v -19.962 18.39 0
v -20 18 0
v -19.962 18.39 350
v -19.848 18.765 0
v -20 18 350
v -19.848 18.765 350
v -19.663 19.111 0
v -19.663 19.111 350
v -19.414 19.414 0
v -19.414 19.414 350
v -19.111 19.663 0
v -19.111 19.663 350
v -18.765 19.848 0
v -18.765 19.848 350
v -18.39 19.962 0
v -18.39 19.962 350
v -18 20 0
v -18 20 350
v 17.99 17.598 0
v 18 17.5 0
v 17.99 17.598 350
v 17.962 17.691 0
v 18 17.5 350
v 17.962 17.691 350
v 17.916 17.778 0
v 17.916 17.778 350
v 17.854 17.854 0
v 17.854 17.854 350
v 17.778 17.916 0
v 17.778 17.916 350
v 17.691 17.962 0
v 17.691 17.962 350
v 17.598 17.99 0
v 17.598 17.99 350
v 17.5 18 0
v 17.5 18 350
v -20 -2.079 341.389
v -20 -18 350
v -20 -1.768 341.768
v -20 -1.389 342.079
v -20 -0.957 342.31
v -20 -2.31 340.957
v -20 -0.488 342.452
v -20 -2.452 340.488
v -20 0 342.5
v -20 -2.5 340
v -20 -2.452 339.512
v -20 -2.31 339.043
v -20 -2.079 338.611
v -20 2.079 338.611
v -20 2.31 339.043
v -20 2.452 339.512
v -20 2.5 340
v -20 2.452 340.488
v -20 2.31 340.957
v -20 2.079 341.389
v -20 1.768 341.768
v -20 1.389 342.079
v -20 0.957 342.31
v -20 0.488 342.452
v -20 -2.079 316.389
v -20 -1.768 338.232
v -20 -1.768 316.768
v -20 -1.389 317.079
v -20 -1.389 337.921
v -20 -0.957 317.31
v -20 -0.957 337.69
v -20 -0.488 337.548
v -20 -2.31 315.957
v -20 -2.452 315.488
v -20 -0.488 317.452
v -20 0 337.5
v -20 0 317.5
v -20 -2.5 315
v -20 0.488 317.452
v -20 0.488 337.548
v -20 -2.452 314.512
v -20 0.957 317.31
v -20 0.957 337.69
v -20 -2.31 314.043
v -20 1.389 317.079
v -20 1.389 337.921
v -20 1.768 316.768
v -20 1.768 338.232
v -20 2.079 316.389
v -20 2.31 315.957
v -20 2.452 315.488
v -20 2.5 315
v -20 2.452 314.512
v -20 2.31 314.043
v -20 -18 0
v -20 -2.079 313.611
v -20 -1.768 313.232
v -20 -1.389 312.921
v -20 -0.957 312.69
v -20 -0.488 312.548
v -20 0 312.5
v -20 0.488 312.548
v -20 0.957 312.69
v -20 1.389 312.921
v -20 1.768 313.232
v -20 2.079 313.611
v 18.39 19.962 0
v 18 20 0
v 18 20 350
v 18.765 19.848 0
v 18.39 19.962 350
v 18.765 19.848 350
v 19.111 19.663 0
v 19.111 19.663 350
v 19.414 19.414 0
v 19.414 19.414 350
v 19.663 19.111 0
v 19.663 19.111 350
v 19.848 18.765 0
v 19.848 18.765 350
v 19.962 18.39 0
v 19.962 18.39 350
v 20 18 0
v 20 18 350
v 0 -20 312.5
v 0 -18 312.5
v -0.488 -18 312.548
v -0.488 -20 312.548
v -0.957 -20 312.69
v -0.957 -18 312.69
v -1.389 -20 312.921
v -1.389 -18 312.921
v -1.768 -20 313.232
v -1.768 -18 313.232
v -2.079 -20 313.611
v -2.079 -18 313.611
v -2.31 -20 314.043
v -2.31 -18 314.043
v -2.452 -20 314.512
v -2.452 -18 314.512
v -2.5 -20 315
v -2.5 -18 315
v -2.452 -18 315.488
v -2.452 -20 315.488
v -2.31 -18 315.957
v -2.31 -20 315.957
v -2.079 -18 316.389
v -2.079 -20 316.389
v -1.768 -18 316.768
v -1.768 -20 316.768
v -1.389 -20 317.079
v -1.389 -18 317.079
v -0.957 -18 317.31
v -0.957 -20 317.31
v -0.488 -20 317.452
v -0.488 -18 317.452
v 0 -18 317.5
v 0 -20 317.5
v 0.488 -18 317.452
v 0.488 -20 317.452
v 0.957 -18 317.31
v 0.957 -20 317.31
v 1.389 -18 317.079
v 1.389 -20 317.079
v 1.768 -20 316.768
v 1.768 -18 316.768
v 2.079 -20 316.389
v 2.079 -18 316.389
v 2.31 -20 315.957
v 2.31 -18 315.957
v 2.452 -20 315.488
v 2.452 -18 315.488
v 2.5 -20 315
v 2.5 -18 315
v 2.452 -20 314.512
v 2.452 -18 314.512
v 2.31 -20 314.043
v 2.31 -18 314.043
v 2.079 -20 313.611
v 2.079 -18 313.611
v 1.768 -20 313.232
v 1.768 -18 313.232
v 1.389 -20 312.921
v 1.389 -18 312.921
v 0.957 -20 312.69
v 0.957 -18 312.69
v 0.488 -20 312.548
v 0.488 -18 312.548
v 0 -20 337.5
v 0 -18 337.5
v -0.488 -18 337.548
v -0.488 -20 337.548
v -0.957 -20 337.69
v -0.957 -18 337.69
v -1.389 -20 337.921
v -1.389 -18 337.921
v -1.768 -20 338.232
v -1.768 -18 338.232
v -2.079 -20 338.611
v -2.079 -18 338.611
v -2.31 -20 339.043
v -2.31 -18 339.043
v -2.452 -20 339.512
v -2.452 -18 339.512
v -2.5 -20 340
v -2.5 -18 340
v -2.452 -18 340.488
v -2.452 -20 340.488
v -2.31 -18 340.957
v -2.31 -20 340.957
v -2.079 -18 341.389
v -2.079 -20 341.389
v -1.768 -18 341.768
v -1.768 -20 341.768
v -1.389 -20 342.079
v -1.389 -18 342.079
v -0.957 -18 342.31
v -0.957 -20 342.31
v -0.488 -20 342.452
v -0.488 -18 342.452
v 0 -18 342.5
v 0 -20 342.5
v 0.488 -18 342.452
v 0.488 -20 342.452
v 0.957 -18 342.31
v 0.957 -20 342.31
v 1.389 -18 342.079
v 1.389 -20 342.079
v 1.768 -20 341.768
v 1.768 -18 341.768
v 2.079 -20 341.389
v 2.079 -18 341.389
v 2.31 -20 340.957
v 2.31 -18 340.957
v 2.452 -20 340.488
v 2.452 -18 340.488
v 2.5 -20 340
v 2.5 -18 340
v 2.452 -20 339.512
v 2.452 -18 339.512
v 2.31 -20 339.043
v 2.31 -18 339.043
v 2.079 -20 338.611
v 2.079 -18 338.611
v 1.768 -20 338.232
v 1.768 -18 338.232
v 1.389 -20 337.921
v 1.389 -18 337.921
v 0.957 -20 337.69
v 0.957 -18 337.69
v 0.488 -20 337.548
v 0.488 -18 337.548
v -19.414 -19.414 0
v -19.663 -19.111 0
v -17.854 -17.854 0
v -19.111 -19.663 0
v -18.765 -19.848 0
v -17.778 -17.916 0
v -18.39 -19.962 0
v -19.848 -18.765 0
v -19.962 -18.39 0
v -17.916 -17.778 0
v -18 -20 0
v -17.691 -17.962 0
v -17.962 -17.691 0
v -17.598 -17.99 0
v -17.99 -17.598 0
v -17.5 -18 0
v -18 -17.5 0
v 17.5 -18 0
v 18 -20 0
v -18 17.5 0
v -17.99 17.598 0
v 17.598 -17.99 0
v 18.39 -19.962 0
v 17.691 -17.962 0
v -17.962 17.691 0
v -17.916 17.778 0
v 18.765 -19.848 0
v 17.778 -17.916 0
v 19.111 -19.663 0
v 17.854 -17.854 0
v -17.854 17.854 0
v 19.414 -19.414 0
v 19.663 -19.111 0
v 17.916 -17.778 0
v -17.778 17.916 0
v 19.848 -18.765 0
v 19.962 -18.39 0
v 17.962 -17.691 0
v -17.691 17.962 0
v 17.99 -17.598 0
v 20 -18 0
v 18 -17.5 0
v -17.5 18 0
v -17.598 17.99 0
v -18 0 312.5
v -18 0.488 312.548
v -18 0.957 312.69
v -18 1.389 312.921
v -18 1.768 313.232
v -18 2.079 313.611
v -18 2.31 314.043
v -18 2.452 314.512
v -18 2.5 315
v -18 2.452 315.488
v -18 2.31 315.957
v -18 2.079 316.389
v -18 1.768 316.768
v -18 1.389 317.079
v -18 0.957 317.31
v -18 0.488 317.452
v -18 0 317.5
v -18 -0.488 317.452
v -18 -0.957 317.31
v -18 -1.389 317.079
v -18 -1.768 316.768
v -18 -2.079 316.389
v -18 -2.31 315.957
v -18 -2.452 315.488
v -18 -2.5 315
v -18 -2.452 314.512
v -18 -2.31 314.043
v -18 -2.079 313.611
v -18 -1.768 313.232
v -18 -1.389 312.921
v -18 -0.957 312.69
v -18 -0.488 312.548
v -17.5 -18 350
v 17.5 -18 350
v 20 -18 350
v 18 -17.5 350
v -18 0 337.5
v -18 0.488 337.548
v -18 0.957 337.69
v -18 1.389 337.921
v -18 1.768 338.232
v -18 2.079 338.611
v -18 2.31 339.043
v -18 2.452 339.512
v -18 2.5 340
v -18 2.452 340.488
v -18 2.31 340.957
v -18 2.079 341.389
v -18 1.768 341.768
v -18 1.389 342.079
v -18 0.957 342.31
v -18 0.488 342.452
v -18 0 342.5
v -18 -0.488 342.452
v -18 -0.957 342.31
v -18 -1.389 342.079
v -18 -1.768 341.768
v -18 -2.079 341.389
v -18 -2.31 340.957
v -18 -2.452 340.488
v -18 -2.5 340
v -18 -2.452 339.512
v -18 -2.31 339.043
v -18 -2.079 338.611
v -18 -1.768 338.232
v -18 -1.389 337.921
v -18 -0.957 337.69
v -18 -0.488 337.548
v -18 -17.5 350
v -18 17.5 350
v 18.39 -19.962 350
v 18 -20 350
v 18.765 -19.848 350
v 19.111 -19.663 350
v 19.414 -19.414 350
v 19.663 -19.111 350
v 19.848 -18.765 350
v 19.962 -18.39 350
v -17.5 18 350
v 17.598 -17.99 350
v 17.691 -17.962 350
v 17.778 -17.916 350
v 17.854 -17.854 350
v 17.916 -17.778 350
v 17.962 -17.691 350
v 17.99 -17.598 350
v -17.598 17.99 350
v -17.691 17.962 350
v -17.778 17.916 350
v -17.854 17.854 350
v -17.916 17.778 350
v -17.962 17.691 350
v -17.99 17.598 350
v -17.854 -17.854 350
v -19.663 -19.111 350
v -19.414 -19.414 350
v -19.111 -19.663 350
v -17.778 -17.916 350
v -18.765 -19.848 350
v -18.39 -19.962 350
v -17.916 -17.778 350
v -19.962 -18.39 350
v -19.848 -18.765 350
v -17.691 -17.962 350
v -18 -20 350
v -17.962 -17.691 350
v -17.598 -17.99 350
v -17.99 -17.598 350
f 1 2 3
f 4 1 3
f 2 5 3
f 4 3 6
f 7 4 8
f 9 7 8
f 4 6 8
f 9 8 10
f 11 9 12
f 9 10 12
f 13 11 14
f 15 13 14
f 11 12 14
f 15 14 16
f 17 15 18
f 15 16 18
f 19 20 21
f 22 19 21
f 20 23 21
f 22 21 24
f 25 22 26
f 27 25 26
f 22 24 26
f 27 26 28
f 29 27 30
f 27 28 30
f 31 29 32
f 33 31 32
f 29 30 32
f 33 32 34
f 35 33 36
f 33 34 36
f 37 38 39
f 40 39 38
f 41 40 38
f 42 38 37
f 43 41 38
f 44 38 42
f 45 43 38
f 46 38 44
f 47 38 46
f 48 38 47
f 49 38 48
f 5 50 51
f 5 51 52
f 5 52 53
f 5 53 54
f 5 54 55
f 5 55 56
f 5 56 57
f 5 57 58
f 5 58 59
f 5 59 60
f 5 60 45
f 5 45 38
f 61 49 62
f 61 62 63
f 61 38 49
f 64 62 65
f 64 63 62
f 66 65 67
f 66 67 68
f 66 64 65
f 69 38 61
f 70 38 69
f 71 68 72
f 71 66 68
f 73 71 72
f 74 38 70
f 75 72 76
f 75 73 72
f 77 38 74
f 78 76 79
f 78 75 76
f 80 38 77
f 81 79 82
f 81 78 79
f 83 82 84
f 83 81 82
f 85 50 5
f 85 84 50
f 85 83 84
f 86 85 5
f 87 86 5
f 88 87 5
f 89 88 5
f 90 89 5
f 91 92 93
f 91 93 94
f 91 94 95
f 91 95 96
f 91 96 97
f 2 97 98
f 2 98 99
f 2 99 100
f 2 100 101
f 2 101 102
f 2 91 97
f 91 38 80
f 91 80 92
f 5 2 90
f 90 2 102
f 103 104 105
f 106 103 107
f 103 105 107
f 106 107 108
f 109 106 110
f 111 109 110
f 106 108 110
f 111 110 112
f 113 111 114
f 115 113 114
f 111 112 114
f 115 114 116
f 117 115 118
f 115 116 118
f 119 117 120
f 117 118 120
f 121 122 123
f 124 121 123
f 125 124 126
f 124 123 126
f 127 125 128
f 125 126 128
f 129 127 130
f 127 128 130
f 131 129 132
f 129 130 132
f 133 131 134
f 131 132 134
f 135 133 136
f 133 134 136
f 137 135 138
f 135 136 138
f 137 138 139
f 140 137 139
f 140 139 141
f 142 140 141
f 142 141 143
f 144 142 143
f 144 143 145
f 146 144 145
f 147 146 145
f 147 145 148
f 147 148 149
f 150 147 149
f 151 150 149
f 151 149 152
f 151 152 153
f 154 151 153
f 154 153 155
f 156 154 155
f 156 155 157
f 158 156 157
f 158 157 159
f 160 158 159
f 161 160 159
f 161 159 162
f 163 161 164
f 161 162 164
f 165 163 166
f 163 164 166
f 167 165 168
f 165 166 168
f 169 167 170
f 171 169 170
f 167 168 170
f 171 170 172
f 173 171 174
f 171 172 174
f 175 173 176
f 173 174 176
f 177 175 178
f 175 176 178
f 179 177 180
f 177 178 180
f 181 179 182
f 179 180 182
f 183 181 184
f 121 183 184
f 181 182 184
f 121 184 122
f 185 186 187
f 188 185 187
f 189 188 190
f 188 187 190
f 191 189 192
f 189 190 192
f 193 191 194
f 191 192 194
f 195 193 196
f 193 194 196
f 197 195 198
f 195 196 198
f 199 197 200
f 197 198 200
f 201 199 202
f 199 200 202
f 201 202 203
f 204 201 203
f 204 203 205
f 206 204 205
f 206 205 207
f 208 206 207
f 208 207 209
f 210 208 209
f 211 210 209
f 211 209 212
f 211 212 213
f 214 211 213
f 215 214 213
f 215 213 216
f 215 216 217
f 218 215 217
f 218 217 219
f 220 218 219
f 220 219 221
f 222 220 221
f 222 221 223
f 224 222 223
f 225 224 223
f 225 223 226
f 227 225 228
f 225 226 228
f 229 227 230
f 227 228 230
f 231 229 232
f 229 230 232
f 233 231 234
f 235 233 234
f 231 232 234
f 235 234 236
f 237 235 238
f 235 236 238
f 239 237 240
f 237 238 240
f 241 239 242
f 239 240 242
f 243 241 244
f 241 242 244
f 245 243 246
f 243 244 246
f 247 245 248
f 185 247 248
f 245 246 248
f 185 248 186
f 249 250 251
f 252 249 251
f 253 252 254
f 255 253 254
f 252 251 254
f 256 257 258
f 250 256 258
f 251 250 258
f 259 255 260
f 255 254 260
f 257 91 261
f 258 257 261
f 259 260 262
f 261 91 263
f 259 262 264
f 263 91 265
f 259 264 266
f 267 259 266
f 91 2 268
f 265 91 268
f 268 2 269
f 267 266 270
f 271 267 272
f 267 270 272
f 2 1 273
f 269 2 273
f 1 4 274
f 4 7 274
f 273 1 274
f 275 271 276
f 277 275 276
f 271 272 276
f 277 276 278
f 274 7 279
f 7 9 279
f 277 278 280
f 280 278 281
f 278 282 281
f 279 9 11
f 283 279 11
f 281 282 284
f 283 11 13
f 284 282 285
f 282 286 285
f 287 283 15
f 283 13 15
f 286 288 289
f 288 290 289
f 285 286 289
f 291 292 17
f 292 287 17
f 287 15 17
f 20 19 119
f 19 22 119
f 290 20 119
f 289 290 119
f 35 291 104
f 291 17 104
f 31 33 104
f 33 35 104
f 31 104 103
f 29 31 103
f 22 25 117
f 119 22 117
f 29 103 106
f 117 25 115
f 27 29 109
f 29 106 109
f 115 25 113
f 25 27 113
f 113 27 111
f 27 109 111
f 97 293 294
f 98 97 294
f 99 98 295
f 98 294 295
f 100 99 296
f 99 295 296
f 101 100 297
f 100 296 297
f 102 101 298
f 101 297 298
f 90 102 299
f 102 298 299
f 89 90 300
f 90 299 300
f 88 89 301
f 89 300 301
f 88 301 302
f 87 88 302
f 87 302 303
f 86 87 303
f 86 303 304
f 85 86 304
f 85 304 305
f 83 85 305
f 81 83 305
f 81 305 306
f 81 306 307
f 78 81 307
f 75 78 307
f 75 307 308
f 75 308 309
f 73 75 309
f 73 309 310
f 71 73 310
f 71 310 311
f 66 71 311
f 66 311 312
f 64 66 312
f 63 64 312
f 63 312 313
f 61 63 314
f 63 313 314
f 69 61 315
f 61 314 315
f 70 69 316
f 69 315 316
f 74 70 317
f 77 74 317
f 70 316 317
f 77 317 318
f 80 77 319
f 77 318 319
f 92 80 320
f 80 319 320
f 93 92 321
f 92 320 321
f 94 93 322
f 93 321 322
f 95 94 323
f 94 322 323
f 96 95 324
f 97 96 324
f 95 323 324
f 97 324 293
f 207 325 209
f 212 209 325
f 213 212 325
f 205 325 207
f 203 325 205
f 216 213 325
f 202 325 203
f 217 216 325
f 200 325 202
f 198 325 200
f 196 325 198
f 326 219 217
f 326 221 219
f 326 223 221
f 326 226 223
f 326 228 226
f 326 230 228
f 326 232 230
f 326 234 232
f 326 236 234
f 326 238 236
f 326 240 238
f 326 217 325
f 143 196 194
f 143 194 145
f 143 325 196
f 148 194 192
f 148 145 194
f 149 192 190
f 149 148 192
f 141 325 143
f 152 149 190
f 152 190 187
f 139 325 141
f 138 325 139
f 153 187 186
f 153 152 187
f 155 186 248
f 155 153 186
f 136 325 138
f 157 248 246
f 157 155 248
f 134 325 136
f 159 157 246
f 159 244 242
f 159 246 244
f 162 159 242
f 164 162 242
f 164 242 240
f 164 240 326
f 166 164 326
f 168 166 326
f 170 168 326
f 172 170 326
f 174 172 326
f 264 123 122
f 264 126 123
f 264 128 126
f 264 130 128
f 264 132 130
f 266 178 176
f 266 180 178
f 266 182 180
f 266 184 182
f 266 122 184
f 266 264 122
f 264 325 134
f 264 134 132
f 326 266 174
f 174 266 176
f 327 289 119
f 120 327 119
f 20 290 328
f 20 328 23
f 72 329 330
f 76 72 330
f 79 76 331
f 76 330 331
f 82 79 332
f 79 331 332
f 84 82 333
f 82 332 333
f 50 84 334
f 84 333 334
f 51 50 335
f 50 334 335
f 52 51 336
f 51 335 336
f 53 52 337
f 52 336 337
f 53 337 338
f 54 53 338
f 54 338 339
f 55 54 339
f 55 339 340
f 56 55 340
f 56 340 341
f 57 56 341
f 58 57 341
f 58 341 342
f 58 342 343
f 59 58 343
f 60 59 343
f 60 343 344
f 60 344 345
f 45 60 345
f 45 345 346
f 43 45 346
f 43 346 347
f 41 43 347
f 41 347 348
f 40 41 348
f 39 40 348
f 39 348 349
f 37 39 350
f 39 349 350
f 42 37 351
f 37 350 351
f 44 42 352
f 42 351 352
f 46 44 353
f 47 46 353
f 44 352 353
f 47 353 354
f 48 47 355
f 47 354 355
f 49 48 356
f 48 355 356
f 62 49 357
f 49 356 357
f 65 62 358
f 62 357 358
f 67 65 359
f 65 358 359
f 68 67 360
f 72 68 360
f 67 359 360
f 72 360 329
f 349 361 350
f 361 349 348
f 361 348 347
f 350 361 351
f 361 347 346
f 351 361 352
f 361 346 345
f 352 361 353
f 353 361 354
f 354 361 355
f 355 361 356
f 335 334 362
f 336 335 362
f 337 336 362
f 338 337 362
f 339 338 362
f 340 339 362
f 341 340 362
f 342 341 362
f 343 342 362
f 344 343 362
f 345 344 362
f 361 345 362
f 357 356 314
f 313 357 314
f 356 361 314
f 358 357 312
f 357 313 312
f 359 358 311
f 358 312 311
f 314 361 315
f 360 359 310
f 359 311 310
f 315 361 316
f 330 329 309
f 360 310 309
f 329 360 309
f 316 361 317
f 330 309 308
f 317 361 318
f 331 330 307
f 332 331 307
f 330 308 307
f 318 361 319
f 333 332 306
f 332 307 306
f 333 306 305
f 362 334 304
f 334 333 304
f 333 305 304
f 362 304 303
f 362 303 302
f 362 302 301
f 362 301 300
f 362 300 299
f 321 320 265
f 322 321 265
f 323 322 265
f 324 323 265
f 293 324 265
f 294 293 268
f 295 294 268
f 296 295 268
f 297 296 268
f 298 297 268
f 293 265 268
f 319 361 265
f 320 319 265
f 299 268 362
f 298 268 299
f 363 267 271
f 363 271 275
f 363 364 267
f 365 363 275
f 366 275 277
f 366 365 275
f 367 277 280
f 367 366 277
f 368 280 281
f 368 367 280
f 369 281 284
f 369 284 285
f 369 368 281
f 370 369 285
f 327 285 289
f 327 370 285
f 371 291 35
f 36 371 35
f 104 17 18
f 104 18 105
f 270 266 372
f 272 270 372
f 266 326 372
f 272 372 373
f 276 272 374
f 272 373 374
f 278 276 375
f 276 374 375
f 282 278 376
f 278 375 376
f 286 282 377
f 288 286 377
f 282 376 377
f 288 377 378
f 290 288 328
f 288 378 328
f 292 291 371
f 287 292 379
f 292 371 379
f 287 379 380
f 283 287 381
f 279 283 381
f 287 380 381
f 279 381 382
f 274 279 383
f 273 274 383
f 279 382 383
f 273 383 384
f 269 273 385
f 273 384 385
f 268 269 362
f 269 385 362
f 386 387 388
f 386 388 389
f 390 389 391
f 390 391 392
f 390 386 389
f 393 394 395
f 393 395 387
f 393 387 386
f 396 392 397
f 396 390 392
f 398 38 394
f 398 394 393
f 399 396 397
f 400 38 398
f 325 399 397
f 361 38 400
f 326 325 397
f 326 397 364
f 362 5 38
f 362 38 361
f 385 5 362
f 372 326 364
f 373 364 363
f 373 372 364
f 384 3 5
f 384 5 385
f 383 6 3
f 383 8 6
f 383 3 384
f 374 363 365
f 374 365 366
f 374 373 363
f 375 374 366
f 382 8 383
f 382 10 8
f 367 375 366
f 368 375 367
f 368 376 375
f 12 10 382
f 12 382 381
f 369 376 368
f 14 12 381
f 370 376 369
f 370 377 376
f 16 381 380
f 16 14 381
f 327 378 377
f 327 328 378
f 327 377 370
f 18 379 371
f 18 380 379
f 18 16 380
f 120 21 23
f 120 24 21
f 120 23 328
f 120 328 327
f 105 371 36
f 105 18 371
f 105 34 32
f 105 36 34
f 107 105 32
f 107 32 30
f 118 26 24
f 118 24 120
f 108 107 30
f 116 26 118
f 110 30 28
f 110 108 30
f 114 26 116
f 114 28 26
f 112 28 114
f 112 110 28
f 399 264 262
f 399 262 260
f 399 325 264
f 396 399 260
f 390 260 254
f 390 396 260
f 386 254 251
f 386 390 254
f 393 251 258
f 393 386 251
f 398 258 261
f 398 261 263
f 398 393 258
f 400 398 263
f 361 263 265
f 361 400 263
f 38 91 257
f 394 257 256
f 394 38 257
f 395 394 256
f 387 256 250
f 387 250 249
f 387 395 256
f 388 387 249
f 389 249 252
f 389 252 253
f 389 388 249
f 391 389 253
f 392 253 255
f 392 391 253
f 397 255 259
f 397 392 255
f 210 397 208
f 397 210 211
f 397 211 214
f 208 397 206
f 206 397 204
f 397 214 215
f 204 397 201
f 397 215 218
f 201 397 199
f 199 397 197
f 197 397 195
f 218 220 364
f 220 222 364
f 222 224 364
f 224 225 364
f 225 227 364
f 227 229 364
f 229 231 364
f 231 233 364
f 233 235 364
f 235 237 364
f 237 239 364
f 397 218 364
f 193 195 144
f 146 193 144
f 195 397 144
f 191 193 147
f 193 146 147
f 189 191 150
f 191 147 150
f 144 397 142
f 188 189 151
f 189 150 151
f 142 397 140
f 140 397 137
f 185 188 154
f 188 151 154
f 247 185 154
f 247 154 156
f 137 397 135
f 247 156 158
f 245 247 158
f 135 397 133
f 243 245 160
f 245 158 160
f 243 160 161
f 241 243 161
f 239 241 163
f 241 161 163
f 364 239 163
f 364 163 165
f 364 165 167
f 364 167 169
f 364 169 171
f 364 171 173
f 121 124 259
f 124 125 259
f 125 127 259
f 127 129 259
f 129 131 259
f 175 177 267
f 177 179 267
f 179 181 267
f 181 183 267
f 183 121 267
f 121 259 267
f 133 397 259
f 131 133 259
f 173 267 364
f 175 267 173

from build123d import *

# Parameters (mm, degrees)
SKETCH1_W           = 40
SKETCH1_H           = 40
SKETCH1_W_2         = 36
SKETCH1_H_2         = 36
EXTRUDE_THIN1_DEPTH = 350
FILLET1_R           = 0.5
FILLET2_R           = 2
SKETCH2_R           = 2.5
CUT_EXTRUDE1_DEPTH  = 352.140997322
CIRPATTERN1_COUNT   = 2
CIRPATTERN1_ANGLE   = 90


with BuildPart() as part:
    # Sketch1 → Extrude-Thin1 (new body)
    with BuildSketch(Plane.XY):
        Rectangle(SKETCH1_W, SKETCH1_H)
        Rectangle(SKETCH1_W_2, SKETCH1_H_2, mode=Mode.SUBTRACT)
    extrude(amount=EXTRUDE_THIN1_DEPTH)

    # Fillet1
    fillet1_edges = [part.edges().sort_by_distance(p)[0] for p in [
        (18, -18, 175),
        (18, 18, 175),
        (-18, 18, 175),
        (-18, -18, 175),
    ]]
    fillet(fillet1_edges, radius=FILLET1_R)

    # Fillet2
    fillet2_edges = [part.edges().sort_by_distance(p)[0] for p in [
        (20, -20, 175),
        (-20, -20, 175),
        (-20, 20, 175),
        (20, 20, 175),
    ]]
    fillet(fillet2_edges, radius=FILLET2_R)

    # Sketch2 → Cut-Extrude1 (cut, through all)
    with BuildSketch(Plane(origin=(0, 0, 0), x_dir=(0, 0, -1), z_dir=(1, 0, 0))):
        with Locations((-340, 0)):
            Circle(SKETCH2_R)
        with Locations((-315, 0)):
            Circle(SKETCH2_R)
    cut_extrude1 = extrude(amount=-CUT_EXTRUDE1_DEPTH, mode=Mode.SUBTRACT)

    # CirPattern1: Cut-Extrude1 ×2 about axis
    cirpattern1_axis = Axis((0, 0, 367.5), (0, 0, 1))
    for i in range(1, CIRPATTERN1_COUNT):
        add(cut_extrude1.rotate(cirpattern1_axis, i * CIRPATTERN1_ANGLE / (CIRPATTERN1_COUNT - 1)), mode=Mode.SUBTRACT)


solid = part.part
